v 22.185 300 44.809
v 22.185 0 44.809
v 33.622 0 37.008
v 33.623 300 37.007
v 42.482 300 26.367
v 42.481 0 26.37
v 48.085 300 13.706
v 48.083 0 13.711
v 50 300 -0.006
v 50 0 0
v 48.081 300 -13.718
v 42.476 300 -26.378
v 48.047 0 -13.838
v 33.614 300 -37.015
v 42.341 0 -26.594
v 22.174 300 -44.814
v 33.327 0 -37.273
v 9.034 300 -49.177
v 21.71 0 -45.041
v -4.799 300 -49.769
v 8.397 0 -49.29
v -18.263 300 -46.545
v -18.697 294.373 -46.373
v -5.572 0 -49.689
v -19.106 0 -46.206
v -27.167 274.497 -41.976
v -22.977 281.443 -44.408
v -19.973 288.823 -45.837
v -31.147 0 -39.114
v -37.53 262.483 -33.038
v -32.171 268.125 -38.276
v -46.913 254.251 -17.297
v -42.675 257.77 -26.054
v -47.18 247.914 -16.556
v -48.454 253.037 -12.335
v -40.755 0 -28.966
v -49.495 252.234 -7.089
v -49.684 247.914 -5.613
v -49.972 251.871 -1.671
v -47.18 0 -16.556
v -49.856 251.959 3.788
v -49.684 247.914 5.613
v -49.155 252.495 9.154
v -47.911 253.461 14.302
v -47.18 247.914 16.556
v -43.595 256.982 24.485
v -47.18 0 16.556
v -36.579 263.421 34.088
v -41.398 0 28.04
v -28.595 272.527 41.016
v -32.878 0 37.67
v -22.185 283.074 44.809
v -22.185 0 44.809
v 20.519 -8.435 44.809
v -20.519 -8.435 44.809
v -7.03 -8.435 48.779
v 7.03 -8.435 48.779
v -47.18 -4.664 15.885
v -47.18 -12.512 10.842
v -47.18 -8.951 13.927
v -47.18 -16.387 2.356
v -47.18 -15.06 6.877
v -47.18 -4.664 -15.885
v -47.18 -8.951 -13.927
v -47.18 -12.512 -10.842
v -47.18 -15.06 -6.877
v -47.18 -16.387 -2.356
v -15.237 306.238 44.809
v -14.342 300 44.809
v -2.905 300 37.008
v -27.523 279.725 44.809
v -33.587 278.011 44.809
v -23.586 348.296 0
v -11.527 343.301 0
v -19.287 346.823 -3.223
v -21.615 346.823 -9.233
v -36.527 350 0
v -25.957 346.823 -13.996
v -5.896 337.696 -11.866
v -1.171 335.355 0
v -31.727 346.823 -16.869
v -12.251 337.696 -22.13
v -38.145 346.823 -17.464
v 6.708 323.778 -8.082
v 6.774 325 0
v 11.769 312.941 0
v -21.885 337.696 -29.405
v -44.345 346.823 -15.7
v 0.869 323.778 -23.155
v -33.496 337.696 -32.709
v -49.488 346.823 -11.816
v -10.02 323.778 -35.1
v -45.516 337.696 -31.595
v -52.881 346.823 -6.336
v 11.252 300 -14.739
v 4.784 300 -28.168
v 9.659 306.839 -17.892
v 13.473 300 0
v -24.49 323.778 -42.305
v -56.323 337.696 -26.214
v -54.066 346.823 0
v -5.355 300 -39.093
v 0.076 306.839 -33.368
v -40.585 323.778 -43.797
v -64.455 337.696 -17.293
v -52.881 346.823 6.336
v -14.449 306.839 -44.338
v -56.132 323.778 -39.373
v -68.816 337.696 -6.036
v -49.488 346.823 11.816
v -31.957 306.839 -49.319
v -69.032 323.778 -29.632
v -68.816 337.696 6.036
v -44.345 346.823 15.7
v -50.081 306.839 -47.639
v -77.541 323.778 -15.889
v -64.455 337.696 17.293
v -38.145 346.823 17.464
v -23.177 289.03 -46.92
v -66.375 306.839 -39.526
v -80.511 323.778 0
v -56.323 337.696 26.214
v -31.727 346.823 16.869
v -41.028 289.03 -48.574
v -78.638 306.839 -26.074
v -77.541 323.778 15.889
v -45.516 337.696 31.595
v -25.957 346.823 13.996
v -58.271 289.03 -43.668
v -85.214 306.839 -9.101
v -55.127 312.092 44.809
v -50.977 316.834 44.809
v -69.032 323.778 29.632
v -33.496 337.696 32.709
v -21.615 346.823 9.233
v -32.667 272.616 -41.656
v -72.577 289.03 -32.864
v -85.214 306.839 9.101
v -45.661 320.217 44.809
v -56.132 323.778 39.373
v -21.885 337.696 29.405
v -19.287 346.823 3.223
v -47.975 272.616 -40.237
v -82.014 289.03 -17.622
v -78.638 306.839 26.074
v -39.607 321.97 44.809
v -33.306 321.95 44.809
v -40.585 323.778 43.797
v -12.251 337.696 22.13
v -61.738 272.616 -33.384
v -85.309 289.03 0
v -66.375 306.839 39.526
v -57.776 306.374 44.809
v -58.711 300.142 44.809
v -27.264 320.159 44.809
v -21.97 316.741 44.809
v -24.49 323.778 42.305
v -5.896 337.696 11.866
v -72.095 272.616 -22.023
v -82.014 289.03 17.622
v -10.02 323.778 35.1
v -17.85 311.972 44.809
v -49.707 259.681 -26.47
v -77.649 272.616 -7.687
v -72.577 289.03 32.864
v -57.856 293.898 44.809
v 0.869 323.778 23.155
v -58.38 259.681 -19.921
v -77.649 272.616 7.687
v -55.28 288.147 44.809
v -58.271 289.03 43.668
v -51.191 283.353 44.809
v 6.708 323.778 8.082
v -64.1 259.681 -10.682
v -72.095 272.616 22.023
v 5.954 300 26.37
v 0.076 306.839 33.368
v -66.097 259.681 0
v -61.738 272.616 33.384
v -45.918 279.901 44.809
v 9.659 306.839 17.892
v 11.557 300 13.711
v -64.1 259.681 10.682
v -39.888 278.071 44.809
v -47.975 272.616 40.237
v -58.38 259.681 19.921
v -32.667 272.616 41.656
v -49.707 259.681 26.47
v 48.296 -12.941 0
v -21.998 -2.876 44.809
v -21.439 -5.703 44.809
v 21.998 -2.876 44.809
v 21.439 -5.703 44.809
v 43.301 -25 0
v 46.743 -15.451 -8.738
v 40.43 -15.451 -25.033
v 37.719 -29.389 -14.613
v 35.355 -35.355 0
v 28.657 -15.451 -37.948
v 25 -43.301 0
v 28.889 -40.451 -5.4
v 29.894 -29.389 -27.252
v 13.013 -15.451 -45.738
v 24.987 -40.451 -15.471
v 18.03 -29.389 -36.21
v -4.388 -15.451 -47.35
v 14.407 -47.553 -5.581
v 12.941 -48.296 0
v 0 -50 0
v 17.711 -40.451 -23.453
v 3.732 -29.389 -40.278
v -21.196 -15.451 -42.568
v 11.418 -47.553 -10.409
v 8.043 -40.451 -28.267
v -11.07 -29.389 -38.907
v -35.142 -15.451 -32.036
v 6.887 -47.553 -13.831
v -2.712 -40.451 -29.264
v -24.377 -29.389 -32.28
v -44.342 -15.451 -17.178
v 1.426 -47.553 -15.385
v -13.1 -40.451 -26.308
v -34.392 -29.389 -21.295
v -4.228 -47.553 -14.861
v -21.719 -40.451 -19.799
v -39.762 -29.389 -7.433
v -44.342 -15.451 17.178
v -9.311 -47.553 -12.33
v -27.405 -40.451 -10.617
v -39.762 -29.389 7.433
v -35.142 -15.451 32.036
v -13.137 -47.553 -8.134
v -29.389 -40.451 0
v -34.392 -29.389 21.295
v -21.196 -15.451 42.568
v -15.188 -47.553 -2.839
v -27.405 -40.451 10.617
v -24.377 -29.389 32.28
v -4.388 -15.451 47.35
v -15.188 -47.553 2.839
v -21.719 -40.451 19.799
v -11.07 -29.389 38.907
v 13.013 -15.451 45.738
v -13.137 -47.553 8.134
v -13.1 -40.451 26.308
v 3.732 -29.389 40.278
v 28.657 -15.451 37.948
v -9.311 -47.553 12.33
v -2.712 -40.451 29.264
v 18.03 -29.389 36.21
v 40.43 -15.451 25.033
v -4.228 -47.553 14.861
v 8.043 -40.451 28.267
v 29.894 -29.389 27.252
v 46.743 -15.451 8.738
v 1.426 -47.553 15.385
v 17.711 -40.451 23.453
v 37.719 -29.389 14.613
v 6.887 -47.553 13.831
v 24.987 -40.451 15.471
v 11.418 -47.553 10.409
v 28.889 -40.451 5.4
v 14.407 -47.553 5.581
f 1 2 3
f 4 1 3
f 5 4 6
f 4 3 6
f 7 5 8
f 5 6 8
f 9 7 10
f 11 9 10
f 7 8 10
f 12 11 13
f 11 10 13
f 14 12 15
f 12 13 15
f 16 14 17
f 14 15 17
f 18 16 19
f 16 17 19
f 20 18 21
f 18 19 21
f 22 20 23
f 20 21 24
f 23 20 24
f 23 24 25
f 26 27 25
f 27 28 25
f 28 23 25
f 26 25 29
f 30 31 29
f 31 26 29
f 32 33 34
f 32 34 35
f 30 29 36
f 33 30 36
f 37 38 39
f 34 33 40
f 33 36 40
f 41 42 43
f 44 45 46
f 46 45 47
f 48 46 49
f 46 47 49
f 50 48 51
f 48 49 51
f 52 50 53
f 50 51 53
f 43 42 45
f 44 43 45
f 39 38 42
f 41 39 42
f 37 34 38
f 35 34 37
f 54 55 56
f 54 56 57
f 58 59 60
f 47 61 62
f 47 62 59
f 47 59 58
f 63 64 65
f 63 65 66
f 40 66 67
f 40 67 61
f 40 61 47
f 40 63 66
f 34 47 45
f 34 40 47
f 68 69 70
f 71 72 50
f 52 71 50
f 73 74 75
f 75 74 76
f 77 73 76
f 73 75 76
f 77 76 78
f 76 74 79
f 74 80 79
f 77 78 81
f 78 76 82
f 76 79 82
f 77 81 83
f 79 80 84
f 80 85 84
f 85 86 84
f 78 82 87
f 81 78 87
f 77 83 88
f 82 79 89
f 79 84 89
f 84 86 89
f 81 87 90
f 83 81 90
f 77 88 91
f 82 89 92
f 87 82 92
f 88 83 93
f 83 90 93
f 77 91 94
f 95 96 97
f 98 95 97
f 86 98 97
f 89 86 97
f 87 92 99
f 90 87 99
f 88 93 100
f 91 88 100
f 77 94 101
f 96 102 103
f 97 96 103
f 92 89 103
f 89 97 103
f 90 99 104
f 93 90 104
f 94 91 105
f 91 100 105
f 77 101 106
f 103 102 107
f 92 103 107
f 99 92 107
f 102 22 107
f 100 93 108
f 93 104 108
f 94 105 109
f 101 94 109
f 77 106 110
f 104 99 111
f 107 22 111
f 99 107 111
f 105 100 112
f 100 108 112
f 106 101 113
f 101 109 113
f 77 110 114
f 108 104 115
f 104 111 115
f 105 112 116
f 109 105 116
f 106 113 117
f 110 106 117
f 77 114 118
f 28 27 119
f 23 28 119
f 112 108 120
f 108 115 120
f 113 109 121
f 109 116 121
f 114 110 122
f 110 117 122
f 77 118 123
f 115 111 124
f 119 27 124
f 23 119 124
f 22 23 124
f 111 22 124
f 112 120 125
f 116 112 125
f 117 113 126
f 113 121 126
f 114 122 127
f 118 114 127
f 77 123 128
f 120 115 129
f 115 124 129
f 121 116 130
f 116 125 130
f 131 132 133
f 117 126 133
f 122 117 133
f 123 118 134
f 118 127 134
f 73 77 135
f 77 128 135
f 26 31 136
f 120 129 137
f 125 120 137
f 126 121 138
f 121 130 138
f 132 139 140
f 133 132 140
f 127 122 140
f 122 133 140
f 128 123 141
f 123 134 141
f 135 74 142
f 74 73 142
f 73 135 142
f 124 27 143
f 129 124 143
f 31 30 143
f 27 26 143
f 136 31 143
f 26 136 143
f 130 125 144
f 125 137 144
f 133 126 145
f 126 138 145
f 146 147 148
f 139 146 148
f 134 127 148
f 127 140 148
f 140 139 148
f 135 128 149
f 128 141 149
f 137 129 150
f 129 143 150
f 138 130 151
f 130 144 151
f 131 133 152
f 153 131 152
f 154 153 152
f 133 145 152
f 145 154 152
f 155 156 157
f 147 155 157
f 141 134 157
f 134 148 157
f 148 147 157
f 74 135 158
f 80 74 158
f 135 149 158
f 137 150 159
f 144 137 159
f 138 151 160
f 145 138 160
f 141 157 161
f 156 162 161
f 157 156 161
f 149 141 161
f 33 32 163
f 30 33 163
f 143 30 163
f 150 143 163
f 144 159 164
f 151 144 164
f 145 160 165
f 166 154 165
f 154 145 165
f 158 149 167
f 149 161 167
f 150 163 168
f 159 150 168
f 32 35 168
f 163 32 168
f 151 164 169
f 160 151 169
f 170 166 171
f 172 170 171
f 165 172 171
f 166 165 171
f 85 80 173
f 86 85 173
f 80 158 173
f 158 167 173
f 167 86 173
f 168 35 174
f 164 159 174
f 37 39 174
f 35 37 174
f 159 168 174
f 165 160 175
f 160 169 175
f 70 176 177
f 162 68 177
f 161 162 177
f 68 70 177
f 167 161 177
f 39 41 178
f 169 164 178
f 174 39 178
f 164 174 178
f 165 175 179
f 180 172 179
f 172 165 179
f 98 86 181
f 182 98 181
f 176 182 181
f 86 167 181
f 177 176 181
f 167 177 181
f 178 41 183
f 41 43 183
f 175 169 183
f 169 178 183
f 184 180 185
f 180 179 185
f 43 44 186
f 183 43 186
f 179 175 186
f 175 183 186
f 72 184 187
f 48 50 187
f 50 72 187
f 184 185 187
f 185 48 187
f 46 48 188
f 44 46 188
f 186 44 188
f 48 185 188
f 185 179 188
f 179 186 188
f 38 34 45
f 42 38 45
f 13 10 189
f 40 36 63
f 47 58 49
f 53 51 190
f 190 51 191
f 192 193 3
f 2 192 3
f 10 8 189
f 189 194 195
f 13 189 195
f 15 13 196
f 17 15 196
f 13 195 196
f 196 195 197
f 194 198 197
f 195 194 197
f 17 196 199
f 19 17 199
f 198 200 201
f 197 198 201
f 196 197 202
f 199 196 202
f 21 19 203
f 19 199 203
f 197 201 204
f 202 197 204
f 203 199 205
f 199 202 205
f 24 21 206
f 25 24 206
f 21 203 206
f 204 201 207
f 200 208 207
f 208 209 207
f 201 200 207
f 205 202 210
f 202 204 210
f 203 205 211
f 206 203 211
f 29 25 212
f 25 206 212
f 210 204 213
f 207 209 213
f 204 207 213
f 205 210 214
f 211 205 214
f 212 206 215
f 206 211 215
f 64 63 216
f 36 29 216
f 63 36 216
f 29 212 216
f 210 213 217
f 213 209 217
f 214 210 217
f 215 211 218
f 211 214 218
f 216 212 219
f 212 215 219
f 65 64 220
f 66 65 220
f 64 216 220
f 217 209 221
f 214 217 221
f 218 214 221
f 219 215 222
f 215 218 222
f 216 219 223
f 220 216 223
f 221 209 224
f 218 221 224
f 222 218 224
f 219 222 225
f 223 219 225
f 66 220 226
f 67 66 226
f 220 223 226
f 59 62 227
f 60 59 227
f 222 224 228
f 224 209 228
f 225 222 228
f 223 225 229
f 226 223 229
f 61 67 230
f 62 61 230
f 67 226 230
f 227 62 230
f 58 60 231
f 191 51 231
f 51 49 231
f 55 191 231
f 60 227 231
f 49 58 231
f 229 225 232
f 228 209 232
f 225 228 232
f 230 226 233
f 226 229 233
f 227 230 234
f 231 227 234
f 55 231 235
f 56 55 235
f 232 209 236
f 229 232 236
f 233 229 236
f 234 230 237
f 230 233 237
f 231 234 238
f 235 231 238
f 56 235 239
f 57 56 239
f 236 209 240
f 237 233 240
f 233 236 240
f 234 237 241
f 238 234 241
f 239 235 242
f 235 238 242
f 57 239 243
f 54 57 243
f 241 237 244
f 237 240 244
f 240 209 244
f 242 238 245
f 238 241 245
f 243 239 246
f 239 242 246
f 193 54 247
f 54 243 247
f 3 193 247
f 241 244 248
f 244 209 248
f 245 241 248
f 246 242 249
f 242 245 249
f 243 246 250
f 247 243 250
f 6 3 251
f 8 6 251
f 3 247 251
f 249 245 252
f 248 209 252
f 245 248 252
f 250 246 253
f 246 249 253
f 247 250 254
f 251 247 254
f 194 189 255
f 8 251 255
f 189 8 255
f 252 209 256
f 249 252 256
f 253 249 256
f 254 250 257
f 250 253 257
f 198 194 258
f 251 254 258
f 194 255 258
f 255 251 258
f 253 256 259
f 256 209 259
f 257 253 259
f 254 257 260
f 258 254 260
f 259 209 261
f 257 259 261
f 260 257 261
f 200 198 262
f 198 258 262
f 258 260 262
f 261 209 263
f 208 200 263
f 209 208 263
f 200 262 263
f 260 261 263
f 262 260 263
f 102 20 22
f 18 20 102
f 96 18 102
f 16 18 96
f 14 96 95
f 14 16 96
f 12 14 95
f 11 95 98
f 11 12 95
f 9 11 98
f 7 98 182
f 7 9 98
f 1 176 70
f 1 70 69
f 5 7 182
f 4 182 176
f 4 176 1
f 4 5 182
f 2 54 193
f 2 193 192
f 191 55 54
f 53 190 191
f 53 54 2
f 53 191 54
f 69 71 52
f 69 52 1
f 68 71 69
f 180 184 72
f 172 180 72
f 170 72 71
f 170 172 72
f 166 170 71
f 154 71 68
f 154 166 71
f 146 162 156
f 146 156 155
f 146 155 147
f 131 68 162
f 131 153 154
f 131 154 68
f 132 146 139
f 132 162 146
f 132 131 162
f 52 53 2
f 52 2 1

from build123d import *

# Parameters (mm, degrees)
SKETCH1_R               = 50
BOSS_EXTRUDE1_DEPTH     = 300
CUT_EXTRUDE1_DEPTH      = 364.987490242
CUT_EXTRUDE1_DEPTH_BACK = 364.987490242
SKETCH4_W               = 12.597132099
SKETCH4_H               = 279.427293847
CUT_EXTRUDE2_DEPTH      = 364.987490242
CUT_EXTRUDE2_DEPTH_BACK = 364.987490242
SKETCH5_W               = 13.949781053
SKETCH5_H               = 363.760783887


with BuildPart() as part:
    # Sketch1 → Boss-Extrude1 (new body)
    with BuildSketch(Plane(origin=(0, 0, 0), x_dir=(1, 0, 0), z_dir=(0, 1, 0))):
        with Locations(Location((0, 0, 0), (0, 0, 270))):
            Circle(SKETCH1_R)
    extrude(amount=BOSS_EXTRUDE1_DEPTH)

    # Sketch2 → Revolve1 (revolve)
    with BuildSketch(Plane.XY):
        with BuildLine():
            Line((-36.526834234, 250), (-36.526834234, 350))
            ThreePointArc((-36.526834234, 350), (13.473165766, 300), (-36.526834234, 250))
        make_face()
    revolve(axis=Axis((-36.526834234, 250, 0), (0, 1, 0)))

    # Sketch3 → Revolve2 (revolve)
    with BuildSketch(Plane.XY):
        with BuildLine():
            Line((0, -50), (0, 50))
            ThreePointArc((0, 50), (50, 0), (0, -50))
        make_face()
    revolve(axis=Axis((0, -50, 0), (0, 1, 0)))

    # Sketch4 → Cut-Extrude1 (cut, two sides: drawn at the far end of the back side and taken through both)
    with BuildSketch(Plane.XY.offset(-CUT_EXTRUDE1_DEPTH_BACK)):
        with Locations((-53.478127305, 108.200425306)):
            Rectangle(SKETCH4_W, SKETCH4_H)
    extrude(amount=CUT_EXTRUDE1_DEPTH + CUT_EXTRUDE1_DEPTH_BACK, mode=Mode.SUBTRACT)

    # Sketch5 → Cut-Extrude2 (cut, two sides: drawn at the far end of the back side and taken through both)
    with BuildSketch(Plane(origin=(0, 0, 0), x_dir=(0, 0, -1), z_dir=(1, 0, 0)).offset(-CUT_EXTRUDE2_DEPTH_BACK)):
        with Locations((-51.783725954, 173.445822779)):
            Rectangle(SKETCH5_W, SKETCH5_H)
    extrude(amount=CUT_EXTRUDE2_DEPTH + CUT_EXTRUDE2_DEPTH_BACK, mode=Mode.SUBTRACT)


solid = part.part
